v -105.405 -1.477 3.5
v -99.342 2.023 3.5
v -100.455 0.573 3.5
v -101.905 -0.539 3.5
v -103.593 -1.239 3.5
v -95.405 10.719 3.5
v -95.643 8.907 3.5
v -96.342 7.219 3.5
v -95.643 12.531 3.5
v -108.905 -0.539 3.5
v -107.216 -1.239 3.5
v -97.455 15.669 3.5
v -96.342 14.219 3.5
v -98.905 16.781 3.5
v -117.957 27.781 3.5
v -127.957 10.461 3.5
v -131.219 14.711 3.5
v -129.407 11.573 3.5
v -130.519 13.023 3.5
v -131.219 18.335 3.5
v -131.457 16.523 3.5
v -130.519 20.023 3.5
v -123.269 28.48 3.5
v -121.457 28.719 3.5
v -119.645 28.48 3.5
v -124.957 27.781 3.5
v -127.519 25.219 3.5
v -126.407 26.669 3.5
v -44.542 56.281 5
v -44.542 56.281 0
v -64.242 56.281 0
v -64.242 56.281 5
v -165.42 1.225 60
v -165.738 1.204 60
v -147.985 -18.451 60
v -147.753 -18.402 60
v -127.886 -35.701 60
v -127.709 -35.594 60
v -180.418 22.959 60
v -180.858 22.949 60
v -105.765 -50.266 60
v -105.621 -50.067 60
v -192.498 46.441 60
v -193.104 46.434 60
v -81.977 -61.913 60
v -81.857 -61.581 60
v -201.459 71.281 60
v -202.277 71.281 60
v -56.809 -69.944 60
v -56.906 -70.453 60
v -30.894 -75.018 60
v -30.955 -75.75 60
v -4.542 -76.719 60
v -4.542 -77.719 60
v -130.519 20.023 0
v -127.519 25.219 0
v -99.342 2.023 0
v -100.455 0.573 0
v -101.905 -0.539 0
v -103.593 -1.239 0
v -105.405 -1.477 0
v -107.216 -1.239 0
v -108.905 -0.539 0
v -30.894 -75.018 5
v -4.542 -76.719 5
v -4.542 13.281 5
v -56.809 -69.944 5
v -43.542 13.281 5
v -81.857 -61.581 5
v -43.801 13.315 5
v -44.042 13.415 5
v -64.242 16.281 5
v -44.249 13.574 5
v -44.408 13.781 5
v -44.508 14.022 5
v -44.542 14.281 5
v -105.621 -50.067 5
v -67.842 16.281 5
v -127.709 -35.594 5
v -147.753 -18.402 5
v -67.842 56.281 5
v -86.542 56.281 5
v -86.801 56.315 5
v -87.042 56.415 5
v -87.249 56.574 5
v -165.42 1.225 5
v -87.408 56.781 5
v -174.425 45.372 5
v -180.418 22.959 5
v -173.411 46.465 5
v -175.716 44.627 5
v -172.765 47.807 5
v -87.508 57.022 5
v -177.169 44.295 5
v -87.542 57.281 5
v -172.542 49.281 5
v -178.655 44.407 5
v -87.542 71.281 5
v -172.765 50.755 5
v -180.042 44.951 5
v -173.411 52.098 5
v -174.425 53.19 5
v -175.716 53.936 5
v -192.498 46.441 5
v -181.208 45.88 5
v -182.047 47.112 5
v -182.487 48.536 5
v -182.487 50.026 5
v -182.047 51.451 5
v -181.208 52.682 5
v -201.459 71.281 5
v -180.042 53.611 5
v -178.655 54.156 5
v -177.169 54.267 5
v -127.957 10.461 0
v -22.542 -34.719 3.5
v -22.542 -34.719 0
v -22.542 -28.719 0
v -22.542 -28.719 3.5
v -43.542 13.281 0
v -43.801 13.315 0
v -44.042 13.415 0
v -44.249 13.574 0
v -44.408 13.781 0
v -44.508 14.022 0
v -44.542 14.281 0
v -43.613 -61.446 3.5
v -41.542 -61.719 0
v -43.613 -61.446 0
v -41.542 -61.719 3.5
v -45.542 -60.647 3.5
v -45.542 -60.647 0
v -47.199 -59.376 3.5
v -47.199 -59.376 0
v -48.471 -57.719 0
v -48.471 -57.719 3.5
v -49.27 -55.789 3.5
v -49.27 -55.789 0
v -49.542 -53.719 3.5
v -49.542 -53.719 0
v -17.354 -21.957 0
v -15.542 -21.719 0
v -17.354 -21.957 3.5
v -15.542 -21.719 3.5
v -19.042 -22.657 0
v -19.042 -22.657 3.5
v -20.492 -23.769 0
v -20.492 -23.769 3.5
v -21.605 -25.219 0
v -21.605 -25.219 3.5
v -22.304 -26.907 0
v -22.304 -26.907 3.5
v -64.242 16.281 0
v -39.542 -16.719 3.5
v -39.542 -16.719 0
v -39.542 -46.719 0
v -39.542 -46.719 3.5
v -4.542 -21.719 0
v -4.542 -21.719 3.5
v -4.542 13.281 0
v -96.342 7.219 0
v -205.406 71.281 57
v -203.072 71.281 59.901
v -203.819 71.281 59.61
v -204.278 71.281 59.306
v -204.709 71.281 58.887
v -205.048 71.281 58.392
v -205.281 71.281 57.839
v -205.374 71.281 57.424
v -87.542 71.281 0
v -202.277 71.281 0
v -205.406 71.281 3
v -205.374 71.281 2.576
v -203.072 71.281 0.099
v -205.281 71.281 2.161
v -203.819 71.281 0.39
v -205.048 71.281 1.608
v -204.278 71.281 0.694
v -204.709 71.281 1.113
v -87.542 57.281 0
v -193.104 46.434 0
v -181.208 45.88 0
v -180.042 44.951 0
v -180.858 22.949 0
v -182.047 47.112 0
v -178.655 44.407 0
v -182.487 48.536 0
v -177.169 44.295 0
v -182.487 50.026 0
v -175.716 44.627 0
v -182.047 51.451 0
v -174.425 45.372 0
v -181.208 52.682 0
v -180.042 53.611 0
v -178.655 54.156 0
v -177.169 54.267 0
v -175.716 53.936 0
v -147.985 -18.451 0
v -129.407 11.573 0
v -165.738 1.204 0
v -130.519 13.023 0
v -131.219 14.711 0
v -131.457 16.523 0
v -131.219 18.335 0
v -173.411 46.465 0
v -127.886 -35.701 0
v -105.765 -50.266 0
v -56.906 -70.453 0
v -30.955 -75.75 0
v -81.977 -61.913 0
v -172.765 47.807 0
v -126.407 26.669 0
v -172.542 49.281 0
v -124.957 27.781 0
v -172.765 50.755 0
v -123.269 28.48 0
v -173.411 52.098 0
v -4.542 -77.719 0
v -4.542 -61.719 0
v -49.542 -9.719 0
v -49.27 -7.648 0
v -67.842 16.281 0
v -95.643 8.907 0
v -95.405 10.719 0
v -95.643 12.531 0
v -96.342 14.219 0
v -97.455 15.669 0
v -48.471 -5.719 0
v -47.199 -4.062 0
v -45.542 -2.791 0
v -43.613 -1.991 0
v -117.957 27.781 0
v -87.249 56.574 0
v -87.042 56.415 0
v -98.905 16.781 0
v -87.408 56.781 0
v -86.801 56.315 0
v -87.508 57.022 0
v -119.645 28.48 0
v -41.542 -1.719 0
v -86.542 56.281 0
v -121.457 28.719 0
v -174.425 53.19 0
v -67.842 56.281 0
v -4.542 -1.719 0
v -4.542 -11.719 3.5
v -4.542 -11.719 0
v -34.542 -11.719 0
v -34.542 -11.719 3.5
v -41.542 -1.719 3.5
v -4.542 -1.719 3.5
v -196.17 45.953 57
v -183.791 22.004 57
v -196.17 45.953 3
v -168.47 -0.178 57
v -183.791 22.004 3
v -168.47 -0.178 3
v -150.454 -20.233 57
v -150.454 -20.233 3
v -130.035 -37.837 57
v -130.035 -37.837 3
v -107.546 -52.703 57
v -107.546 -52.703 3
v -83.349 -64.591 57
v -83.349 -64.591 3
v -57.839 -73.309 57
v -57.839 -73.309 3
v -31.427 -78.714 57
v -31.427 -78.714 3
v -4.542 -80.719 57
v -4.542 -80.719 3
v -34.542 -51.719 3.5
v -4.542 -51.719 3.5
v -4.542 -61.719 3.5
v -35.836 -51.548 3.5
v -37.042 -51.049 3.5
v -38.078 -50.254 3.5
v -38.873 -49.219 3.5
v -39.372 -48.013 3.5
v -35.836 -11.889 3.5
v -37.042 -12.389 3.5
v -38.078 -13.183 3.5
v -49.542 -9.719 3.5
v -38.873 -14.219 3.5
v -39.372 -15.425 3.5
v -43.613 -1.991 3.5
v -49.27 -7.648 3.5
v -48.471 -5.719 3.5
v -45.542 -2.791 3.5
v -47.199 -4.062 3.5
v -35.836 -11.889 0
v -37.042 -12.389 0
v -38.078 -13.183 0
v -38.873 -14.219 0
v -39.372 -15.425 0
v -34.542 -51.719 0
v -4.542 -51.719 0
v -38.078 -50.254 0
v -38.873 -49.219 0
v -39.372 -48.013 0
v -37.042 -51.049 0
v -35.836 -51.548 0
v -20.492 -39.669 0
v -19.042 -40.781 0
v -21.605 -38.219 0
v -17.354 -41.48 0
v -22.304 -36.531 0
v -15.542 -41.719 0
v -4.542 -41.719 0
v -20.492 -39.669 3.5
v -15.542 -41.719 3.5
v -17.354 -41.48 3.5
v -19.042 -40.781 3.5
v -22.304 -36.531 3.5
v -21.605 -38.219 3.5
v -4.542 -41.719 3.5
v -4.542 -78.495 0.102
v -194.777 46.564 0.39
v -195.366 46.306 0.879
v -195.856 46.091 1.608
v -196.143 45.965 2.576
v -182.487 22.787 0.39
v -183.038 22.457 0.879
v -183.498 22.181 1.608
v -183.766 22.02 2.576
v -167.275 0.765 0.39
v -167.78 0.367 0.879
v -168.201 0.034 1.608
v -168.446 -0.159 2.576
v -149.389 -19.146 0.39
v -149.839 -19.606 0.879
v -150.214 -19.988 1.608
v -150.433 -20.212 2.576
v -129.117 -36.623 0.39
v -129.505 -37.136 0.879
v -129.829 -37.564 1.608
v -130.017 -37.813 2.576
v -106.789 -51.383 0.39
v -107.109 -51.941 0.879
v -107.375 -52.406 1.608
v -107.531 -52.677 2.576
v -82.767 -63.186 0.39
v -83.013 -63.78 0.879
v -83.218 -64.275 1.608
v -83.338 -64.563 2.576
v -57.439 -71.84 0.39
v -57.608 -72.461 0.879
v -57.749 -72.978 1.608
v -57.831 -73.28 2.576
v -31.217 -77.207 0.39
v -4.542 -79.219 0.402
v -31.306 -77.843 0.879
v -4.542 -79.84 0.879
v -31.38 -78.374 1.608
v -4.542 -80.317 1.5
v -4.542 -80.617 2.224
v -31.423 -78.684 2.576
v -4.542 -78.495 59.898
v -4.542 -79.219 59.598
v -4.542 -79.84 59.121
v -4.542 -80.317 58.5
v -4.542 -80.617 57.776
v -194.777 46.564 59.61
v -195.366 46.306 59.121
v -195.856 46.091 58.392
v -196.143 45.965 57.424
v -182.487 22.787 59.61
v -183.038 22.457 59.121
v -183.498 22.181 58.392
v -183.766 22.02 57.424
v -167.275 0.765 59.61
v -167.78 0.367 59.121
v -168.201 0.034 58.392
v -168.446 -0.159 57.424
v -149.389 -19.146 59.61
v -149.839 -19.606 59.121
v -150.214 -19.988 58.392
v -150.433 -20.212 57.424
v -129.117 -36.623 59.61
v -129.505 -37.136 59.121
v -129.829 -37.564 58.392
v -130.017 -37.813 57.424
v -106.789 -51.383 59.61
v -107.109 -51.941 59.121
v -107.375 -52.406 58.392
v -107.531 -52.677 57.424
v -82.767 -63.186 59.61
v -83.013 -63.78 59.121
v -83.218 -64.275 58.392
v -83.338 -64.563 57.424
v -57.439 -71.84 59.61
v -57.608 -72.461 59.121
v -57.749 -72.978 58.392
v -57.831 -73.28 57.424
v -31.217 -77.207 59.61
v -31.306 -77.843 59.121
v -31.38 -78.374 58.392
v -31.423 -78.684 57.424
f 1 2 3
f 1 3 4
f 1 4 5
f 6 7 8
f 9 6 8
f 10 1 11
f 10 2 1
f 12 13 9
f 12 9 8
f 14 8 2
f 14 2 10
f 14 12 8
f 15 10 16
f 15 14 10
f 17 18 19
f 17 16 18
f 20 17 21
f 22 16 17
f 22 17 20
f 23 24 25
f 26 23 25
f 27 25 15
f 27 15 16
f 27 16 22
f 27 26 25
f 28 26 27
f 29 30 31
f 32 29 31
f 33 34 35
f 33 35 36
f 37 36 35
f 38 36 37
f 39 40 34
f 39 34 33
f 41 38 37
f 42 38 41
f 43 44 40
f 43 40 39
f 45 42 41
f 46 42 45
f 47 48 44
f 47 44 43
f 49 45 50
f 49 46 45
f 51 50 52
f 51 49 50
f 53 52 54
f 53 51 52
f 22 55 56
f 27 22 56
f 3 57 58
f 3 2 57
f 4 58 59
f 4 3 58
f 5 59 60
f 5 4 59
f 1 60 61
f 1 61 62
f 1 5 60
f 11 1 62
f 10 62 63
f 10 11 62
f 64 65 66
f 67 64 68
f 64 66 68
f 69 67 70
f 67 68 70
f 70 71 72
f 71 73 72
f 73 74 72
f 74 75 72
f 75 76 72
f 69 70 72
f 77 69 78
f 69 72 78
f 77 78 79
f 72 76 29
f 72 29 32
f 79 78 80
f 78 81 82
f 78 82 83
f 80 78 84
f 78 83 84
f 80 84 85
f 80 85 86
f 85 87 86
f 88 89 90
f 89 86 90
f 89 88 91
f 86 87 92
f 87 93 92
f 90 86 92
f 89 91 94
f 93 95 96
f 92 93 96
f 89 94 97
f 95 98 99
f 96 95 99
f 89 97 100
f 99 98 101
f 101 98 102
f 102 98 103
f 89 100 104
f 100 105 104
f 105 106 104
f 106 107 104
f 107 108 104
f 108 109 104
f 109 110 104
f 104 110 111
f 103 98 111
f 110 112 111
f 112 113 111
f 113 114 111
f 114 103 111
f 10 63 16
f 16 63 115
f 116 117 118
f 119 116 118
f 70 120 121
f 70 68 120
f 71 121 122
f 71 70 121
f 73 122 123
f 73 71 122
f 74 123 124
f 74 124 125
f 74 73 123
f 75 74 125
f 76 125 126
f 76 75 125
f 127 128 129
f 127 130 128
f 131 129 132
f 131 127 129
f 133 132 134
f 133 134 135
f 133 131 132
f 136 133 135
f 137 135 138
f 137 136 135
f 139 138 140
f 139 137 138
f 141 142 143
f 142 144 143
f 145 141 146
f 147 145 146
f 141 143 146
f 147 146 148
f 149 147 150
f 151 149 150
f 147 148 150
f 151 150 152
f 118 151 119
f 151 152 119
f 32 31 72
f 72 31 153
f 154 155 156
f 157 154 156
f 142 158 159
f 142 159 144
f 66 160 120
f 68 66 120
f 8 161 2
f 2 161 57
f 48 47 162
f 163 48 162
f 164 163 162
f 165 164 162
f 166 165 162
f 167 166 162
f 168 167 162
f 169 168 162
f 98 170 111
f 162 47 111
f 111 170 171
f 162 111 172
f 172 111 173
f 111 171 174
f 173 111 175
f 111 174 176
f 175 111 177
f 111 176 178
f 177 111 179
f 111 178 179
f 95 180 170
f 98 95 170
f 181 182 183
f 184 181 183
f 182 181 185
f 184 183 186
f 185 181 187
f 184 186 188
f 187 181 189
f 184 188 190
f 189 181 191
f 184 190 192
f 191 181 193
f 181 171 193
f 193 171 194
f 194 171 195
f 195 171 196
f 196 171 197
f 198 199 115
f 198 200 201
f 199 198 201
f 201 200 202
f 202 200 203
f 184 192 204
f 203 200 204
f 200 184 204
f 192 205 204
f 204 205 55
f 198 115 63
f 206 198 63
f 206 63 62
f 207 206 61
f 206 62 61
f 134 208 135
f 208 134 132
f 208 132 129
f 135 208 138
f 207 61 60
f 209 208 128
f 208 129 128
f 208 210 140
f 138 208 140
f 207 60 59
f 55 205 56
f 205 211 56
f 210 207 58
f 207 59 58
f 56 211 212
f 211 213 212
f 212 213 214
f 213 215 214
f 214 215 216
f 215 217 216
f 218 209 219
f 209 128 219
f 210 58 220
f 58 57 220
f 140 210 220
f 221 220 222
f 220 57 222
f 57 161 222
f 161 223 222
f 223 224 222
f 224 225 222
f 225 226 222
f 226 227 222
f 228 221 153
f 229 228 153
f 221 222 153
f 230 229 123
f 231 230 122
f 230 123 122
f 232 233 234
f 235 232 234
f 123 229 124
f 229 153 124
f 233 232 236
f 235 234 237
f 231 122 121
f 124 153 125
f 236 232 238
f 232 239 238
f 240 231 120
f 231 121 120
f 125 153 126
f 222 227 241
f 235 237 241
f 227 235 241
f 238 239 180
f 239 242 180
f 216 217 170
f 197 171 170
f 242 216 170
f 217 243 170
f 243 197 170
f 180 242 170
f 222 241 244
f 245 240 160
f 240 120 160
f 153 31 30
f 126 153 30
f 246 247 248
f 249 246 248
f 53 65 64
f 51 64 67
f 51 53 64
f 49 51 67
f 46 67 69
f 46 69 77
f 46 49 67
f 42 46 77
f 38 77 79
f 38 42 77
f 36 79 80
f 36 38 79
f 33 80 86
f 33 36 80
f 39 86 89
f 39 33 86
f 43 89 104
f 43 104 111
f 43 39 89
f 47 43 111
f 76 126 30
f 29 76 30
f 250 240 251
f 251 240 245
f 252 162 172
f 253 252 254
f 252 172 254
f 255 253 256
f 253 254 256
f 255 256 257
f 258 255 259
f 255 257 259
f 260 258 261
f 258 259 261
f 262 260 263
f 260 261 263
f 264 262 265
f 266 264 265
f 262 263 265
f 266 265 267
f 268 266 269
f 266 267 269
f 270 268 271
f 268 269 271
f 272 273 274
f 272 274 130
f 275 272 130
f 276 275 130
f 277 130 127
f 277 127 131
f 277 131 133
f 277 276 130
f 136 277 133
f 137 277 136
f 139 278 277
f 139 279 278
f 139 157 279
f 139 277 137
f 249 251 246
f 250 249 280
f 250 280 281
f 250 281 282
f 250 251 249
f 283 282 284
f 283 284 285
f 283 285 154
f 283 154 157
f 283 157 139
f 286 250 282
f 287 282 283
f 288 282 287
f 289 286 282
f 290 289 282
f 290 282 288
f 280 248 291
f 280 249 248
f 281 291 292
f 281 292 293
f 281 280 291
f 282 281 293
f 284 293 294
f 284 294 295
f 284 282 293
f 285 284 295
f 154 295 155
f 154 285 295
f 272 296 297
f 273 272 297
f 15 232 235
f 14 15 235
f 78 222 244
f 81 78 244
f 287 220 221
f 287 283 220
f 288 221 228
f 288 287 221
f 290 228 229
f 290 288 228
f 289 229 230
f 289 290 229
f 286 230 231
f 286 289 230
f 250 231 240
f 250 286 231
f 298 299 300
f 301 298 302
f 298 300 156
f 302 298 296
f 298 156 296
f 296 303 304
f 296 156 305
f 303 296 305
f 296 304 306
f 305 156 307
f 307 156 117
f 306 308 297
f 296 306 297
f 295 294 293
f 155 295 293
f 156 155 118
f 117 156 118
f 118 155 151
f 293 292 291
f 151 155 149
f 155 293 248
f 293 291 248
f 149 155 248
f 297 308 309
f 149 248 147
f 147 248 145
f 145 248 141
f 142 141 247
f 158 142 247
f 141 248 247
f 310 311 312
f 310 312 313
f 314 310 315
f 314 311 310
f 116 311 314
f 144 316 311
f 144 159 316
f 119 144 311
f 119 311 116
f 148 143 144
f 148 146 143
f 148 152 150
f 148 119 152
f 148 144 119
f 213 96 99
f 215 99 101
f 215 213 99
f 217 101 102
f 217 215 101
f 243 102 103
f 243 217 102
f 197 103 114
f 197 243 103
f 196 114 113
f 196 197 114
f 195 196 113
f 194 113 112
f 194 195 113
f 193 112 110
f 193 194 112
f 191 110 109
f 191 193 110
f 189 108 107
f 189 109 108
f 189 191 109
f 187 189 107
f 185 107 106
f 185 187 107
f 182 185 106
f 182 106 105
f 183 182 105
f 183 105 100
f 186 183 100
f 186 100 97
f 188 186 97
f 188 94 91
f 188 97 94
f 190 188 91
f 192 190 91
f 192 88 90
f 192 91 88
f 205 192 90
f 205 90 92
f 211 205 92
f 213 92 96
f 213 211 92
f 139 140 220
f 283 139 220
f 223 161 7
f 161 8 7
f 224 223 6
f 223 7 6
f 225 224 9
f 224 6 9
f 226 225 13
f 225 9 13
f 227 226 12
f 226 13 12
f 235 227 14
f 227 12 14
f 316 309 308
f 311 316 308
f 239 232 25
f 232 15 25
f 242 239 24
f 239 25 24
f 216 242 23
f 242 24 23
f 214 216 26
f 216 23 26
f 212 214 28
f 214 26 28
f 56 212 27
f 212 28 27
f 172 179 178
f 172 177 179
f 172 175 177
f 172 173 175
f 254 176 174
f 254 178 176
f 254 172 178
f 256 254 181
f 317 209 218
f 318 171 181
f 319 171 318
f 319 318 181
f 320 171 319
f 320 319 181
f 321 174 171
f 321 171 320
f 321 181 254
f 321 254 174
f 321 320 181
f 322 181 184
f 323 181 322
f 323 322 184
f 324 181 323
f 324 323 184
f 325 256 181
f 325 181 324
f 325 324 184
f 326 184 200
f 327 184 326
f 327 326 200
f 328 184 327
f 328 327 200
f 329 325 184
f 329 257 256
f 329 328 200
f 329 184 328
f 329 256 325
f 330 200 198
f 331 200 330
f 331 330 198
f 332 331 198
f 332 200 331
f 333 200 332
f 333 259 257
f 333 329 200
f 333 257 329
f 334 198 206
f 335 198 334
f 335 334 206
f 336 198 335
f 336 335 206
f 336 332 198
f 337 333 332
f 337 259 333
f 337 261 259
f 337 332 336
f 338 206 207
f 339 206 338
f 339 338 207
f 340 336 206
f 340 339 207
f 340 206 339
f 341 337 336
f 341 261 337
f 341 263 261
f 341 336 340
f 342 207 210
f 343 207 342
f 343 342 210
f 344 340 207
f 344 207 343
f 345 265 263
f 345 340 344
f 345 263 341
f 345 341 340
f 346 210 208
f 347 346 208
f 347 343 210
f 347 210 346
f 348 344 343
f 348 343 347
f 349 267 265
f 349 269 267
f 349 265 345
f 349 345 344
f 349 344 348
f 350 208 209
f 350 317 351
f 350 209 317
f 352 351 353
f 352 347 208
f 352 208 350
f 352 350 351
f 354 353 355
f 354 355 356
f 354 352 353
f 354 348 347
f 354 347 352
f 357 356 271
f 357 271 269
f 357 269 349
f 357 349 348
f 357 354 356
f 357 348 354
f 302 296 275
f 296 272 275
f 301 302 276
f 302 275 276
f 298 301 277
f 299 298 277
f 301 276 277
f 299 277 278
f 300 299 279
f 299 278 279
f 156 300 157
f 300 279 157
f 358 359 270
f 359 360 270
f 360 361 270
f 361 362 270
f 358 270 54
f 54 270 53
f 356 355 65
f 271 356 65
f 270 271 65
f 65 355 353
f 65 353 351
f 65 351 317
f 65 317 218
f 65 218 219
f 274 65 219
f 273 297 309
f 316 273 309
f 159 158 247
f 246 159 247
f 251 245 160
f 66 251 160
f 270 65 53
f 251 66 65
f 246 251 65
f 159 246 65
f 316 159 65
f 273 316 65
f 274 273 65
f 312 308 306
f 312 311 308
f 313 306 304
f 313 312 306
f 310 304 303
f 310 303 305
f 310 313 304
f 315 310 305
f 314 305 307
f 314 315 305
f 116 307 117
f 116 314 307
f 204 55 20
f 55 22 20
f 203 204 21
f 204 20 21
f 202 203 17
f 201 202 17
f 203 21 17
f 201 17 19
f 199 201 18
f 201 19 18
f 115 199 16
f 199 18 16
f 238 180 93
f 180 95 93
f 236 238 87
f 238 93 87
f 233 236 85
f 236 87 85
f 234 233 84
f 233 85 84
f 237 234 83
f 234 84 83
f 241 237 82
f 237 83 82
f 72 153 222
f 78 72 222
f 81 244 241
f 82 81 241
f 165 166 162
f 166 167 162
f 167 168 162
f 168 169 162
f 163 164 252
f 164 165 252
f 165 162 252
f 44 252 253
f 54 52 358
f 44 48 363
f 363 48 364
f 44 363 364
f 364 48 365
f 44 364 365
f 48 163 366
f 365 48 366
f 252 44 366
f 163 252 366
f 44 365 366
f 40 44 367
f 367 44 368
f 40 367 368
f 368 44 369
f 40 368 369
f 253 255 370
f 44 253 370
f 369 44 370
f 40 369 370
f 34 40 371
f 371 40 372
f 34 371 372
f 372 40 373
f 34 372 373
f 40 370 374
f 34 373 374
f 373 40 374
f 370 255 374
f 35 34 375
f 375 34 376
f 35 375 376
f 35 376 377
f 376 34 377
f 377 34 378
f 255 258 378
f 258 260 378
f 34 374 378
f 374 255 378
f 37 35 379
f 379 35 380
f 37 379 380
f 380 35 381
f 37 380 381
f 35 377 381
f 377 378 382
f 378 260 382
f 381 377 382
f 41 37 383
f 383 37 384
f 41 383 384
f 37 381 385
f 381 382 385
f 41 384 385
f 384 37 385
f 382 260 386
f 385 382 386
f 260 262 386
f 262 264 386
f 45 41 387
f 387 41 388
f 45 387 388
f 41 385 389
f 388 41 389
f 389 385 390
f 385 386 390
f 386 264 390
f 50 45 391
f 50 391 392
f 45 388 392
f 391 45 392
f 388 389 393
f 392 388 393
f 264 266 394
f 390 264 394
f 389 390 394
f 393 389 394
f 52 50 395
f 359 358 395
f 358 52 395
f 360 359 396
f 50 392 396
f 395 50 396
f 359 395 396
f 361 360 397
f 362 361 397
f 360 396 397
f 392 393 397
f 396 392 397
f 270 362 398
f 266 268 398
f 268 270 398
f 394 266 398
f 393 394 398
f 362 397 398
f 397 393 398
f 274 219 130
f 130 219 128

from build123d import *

# Parameters (mm, degrees)
SKETCH1_R           = 5
BOSS_EXTRUDE1_DEPTH = 60
CUT_EXTRUDE1_DEPTH  = 55
CUT_EXTRUDE2_DEPTH  = 3.5
FILLET1_R           = 3
SKETCH4_W           = 18
SKETCH4_H           = 20
CUT_EXTRUDE3_DEPTH  = 3.5
FILLET3_R           = 7
FILLET4_R           = 1
FILLET5_R           = 8
FILLET6_R           = 5


with BuildPart() as part:
    # Sketch1 → Boss-Extrude1 (new body)
    # profile 1 of 2: a face of its own
    with BuildSketch(Plane.XY):
        with BuildLine():
            ThreePointArc((-201.458607688, 71.281187739), (-127.708935748, -35.593764587), (-4.542381846, -76.718812261))
            Line((-4.542381846, -76.718812261), (-4.542381846, -6.718812261))
            Line((-4.542381846, -6.718812261), (-4.542381846, 13.281187739))
            Line((-4.542381846, 13.281187739), (-44.542381846, 13.281187739))
            Line((-44.542381846, 13.281187739), (-44.542381846, 56.281187739))
            Line((-44.542381846, 56.281187739), (-64.242381846, 56.281187739))
            Line((-64.242381846, 56.281187739), (-64.242381846, 16.281187739))
            Line((-64.242381846, 16.281187739), (-67.842381846, 16.281187739))
            Line((-67.842381846, 16.281187739), (-67.842381846, 56.281187739))
            Line((-67.842381846, 56.281187739), (-87.542381846, 56.281187739))
            Line((-87.542381846, 56.281187739), (-87.542381846, 71.281187739))
            Line((-87.542381846, 71.281187739), (-201.458607688, 71.281187739))
        make_face()
        with Locations((-177.542381846, 49.281187739)):
            Circle(SKETCH1_R, mode=Mode.SUBTRACT)
    # profile 2 of 2: a face of its own
    with BuildSketch(Plane.XY):
        with BuildLine():
            Line((-4.542381846, -80.718812261), (-4.542381846, -76.718812261))
            ThreePointArc((-4.542381846, -76.718812261), (-127.708935748, -35.593764587), (-201.458607688, 71.281187739))
            Line((-201.458607688, 71.281187739), (-205.405610163, 71.281187739))
            ThreePointArc((-205.405610163, 71.281187739), (-130.035471154, -37.836764924), (-4.542381846, -80.718812261))
        make_face()
    extrude(amount=BOSS_EXTRUDE1_DEPTH)

    # Sketch2 → Cut-Extrude1 (cut)
    with BuildSketch(Plane.XY.offset(60)):
        with BuildLine():
            Line((-4.542381846, 71.281187739), (-4.542381846, -76.718812261))
            ThreePointArc((-4.542381846, -76.718812261), (-127.708935748, -35.593764587), (-201.458607688, 71.281187739))
            Line((-201.458607688, 71.281187739), (-4.542381846, 71.281187739))
        make_face()
    extrude(amount=-CUT_EXTRUDE1_DEPTH, mode=Mode.SUBTRACT)

    # Sketch3 → Cut-Extrude2 (cut)
    with BuildSketch(Plane(origin=(0, 0, 0), x_dir=(-1, 0, 0), z_dir=(0, 0, -1))):
        Polygon((4.542381846, -61.718812261), (49.542381846, -61.718812261), (49.542381846, -51.718812261), (49.542381846, -21.718812261), (49.542381846, -1.718812261), (4.542381846, -1.718812261), (4.542381846, -11.718812261), (39.542381846, -11.718812261), (39.542381846, -51.718812261), (4.542381846, -51.718812261), align=None)
    extrude(amount=-CUT_EXTRUDE2_DEPTH, mode=Mode.SUBTRACT)

    # Fillet1
    fillet1_edges = [part.edges().sort_by_distance(p)[0] for p in [
        (-130.035471154, -37.836764924, 60),
        (-130.035471154, -37.836764924, 0),
    ]]
    fillet(fillet1_edges, radius=FILLET1_R)

    # Sketch4 → Cut-Extrude3 (cut)
    with BuildSketch(Plane(origin=(0, 0, 0), x_dir=(-1, 0, 0), z_dir=(0, 0, -1))):
        Polygon((102.842381846, -4.039320336), (134.019296382, 13.960679664), (124.019296382, 31.281187739), (92.842381846, 13.281187739), align=None)
        with Locations((13.542381846, -31.718812261)):
            Rectangle(SKETCH4_W, SKETCH4_H)
    extrude(amount=-CUT_EXTRUDE3_DEPTH, mode=Mode.SUBTRACT)

    # Fillet3
    fillet3_edges = [part.edges().sort_by_distance(p)[0] for p in [
        (-102.842381846, -4.039320336, 1.75),
        (-92.842381846, 13.281187739, 1.75),
        (-124.019296382, 31.281187739, 1.75),
        (-134.019296382, 13.960679664, 1.75),
        (-22.542381846, -21.718812261, 1.75),
        (-22.542381846, -41.718812261, 1.75),
    ]]
    fillet(fillet3_edges, radius=FILLET3_R)

    # Fillet4
    fillet4_edges = [part.edges().sort_by_distance(p)[0] for p in [
        (-87.542381846, 56.281187739, 2.5),
        (-44.542381846, 13.281187739, 2.5),
    ]]
    fillet(fillet4_edges, radius=FILLET4_R)

    # Fillet5
    fillet5_edges = [part.edges().sort_by_distance(p)[0] for p in [
        (-49.542381846, -1.718812261, 1.75),
        (-49.542381846, -61.718812261, 1.75),
    ]]
    fillet(fillet5_edges, radius=FILLET5_R)

    # Fillet6
    fillet6_edges = [part.edges().sort_by_distance(p)[0] for p in [
        (-39.542381846, -51.718812261, 1.75),
        (-39.542381846, -11.718812261, 1.75),
    ]]
    fillet(fillet6_edges, radius=FILLET6_R)


solid = part.part
